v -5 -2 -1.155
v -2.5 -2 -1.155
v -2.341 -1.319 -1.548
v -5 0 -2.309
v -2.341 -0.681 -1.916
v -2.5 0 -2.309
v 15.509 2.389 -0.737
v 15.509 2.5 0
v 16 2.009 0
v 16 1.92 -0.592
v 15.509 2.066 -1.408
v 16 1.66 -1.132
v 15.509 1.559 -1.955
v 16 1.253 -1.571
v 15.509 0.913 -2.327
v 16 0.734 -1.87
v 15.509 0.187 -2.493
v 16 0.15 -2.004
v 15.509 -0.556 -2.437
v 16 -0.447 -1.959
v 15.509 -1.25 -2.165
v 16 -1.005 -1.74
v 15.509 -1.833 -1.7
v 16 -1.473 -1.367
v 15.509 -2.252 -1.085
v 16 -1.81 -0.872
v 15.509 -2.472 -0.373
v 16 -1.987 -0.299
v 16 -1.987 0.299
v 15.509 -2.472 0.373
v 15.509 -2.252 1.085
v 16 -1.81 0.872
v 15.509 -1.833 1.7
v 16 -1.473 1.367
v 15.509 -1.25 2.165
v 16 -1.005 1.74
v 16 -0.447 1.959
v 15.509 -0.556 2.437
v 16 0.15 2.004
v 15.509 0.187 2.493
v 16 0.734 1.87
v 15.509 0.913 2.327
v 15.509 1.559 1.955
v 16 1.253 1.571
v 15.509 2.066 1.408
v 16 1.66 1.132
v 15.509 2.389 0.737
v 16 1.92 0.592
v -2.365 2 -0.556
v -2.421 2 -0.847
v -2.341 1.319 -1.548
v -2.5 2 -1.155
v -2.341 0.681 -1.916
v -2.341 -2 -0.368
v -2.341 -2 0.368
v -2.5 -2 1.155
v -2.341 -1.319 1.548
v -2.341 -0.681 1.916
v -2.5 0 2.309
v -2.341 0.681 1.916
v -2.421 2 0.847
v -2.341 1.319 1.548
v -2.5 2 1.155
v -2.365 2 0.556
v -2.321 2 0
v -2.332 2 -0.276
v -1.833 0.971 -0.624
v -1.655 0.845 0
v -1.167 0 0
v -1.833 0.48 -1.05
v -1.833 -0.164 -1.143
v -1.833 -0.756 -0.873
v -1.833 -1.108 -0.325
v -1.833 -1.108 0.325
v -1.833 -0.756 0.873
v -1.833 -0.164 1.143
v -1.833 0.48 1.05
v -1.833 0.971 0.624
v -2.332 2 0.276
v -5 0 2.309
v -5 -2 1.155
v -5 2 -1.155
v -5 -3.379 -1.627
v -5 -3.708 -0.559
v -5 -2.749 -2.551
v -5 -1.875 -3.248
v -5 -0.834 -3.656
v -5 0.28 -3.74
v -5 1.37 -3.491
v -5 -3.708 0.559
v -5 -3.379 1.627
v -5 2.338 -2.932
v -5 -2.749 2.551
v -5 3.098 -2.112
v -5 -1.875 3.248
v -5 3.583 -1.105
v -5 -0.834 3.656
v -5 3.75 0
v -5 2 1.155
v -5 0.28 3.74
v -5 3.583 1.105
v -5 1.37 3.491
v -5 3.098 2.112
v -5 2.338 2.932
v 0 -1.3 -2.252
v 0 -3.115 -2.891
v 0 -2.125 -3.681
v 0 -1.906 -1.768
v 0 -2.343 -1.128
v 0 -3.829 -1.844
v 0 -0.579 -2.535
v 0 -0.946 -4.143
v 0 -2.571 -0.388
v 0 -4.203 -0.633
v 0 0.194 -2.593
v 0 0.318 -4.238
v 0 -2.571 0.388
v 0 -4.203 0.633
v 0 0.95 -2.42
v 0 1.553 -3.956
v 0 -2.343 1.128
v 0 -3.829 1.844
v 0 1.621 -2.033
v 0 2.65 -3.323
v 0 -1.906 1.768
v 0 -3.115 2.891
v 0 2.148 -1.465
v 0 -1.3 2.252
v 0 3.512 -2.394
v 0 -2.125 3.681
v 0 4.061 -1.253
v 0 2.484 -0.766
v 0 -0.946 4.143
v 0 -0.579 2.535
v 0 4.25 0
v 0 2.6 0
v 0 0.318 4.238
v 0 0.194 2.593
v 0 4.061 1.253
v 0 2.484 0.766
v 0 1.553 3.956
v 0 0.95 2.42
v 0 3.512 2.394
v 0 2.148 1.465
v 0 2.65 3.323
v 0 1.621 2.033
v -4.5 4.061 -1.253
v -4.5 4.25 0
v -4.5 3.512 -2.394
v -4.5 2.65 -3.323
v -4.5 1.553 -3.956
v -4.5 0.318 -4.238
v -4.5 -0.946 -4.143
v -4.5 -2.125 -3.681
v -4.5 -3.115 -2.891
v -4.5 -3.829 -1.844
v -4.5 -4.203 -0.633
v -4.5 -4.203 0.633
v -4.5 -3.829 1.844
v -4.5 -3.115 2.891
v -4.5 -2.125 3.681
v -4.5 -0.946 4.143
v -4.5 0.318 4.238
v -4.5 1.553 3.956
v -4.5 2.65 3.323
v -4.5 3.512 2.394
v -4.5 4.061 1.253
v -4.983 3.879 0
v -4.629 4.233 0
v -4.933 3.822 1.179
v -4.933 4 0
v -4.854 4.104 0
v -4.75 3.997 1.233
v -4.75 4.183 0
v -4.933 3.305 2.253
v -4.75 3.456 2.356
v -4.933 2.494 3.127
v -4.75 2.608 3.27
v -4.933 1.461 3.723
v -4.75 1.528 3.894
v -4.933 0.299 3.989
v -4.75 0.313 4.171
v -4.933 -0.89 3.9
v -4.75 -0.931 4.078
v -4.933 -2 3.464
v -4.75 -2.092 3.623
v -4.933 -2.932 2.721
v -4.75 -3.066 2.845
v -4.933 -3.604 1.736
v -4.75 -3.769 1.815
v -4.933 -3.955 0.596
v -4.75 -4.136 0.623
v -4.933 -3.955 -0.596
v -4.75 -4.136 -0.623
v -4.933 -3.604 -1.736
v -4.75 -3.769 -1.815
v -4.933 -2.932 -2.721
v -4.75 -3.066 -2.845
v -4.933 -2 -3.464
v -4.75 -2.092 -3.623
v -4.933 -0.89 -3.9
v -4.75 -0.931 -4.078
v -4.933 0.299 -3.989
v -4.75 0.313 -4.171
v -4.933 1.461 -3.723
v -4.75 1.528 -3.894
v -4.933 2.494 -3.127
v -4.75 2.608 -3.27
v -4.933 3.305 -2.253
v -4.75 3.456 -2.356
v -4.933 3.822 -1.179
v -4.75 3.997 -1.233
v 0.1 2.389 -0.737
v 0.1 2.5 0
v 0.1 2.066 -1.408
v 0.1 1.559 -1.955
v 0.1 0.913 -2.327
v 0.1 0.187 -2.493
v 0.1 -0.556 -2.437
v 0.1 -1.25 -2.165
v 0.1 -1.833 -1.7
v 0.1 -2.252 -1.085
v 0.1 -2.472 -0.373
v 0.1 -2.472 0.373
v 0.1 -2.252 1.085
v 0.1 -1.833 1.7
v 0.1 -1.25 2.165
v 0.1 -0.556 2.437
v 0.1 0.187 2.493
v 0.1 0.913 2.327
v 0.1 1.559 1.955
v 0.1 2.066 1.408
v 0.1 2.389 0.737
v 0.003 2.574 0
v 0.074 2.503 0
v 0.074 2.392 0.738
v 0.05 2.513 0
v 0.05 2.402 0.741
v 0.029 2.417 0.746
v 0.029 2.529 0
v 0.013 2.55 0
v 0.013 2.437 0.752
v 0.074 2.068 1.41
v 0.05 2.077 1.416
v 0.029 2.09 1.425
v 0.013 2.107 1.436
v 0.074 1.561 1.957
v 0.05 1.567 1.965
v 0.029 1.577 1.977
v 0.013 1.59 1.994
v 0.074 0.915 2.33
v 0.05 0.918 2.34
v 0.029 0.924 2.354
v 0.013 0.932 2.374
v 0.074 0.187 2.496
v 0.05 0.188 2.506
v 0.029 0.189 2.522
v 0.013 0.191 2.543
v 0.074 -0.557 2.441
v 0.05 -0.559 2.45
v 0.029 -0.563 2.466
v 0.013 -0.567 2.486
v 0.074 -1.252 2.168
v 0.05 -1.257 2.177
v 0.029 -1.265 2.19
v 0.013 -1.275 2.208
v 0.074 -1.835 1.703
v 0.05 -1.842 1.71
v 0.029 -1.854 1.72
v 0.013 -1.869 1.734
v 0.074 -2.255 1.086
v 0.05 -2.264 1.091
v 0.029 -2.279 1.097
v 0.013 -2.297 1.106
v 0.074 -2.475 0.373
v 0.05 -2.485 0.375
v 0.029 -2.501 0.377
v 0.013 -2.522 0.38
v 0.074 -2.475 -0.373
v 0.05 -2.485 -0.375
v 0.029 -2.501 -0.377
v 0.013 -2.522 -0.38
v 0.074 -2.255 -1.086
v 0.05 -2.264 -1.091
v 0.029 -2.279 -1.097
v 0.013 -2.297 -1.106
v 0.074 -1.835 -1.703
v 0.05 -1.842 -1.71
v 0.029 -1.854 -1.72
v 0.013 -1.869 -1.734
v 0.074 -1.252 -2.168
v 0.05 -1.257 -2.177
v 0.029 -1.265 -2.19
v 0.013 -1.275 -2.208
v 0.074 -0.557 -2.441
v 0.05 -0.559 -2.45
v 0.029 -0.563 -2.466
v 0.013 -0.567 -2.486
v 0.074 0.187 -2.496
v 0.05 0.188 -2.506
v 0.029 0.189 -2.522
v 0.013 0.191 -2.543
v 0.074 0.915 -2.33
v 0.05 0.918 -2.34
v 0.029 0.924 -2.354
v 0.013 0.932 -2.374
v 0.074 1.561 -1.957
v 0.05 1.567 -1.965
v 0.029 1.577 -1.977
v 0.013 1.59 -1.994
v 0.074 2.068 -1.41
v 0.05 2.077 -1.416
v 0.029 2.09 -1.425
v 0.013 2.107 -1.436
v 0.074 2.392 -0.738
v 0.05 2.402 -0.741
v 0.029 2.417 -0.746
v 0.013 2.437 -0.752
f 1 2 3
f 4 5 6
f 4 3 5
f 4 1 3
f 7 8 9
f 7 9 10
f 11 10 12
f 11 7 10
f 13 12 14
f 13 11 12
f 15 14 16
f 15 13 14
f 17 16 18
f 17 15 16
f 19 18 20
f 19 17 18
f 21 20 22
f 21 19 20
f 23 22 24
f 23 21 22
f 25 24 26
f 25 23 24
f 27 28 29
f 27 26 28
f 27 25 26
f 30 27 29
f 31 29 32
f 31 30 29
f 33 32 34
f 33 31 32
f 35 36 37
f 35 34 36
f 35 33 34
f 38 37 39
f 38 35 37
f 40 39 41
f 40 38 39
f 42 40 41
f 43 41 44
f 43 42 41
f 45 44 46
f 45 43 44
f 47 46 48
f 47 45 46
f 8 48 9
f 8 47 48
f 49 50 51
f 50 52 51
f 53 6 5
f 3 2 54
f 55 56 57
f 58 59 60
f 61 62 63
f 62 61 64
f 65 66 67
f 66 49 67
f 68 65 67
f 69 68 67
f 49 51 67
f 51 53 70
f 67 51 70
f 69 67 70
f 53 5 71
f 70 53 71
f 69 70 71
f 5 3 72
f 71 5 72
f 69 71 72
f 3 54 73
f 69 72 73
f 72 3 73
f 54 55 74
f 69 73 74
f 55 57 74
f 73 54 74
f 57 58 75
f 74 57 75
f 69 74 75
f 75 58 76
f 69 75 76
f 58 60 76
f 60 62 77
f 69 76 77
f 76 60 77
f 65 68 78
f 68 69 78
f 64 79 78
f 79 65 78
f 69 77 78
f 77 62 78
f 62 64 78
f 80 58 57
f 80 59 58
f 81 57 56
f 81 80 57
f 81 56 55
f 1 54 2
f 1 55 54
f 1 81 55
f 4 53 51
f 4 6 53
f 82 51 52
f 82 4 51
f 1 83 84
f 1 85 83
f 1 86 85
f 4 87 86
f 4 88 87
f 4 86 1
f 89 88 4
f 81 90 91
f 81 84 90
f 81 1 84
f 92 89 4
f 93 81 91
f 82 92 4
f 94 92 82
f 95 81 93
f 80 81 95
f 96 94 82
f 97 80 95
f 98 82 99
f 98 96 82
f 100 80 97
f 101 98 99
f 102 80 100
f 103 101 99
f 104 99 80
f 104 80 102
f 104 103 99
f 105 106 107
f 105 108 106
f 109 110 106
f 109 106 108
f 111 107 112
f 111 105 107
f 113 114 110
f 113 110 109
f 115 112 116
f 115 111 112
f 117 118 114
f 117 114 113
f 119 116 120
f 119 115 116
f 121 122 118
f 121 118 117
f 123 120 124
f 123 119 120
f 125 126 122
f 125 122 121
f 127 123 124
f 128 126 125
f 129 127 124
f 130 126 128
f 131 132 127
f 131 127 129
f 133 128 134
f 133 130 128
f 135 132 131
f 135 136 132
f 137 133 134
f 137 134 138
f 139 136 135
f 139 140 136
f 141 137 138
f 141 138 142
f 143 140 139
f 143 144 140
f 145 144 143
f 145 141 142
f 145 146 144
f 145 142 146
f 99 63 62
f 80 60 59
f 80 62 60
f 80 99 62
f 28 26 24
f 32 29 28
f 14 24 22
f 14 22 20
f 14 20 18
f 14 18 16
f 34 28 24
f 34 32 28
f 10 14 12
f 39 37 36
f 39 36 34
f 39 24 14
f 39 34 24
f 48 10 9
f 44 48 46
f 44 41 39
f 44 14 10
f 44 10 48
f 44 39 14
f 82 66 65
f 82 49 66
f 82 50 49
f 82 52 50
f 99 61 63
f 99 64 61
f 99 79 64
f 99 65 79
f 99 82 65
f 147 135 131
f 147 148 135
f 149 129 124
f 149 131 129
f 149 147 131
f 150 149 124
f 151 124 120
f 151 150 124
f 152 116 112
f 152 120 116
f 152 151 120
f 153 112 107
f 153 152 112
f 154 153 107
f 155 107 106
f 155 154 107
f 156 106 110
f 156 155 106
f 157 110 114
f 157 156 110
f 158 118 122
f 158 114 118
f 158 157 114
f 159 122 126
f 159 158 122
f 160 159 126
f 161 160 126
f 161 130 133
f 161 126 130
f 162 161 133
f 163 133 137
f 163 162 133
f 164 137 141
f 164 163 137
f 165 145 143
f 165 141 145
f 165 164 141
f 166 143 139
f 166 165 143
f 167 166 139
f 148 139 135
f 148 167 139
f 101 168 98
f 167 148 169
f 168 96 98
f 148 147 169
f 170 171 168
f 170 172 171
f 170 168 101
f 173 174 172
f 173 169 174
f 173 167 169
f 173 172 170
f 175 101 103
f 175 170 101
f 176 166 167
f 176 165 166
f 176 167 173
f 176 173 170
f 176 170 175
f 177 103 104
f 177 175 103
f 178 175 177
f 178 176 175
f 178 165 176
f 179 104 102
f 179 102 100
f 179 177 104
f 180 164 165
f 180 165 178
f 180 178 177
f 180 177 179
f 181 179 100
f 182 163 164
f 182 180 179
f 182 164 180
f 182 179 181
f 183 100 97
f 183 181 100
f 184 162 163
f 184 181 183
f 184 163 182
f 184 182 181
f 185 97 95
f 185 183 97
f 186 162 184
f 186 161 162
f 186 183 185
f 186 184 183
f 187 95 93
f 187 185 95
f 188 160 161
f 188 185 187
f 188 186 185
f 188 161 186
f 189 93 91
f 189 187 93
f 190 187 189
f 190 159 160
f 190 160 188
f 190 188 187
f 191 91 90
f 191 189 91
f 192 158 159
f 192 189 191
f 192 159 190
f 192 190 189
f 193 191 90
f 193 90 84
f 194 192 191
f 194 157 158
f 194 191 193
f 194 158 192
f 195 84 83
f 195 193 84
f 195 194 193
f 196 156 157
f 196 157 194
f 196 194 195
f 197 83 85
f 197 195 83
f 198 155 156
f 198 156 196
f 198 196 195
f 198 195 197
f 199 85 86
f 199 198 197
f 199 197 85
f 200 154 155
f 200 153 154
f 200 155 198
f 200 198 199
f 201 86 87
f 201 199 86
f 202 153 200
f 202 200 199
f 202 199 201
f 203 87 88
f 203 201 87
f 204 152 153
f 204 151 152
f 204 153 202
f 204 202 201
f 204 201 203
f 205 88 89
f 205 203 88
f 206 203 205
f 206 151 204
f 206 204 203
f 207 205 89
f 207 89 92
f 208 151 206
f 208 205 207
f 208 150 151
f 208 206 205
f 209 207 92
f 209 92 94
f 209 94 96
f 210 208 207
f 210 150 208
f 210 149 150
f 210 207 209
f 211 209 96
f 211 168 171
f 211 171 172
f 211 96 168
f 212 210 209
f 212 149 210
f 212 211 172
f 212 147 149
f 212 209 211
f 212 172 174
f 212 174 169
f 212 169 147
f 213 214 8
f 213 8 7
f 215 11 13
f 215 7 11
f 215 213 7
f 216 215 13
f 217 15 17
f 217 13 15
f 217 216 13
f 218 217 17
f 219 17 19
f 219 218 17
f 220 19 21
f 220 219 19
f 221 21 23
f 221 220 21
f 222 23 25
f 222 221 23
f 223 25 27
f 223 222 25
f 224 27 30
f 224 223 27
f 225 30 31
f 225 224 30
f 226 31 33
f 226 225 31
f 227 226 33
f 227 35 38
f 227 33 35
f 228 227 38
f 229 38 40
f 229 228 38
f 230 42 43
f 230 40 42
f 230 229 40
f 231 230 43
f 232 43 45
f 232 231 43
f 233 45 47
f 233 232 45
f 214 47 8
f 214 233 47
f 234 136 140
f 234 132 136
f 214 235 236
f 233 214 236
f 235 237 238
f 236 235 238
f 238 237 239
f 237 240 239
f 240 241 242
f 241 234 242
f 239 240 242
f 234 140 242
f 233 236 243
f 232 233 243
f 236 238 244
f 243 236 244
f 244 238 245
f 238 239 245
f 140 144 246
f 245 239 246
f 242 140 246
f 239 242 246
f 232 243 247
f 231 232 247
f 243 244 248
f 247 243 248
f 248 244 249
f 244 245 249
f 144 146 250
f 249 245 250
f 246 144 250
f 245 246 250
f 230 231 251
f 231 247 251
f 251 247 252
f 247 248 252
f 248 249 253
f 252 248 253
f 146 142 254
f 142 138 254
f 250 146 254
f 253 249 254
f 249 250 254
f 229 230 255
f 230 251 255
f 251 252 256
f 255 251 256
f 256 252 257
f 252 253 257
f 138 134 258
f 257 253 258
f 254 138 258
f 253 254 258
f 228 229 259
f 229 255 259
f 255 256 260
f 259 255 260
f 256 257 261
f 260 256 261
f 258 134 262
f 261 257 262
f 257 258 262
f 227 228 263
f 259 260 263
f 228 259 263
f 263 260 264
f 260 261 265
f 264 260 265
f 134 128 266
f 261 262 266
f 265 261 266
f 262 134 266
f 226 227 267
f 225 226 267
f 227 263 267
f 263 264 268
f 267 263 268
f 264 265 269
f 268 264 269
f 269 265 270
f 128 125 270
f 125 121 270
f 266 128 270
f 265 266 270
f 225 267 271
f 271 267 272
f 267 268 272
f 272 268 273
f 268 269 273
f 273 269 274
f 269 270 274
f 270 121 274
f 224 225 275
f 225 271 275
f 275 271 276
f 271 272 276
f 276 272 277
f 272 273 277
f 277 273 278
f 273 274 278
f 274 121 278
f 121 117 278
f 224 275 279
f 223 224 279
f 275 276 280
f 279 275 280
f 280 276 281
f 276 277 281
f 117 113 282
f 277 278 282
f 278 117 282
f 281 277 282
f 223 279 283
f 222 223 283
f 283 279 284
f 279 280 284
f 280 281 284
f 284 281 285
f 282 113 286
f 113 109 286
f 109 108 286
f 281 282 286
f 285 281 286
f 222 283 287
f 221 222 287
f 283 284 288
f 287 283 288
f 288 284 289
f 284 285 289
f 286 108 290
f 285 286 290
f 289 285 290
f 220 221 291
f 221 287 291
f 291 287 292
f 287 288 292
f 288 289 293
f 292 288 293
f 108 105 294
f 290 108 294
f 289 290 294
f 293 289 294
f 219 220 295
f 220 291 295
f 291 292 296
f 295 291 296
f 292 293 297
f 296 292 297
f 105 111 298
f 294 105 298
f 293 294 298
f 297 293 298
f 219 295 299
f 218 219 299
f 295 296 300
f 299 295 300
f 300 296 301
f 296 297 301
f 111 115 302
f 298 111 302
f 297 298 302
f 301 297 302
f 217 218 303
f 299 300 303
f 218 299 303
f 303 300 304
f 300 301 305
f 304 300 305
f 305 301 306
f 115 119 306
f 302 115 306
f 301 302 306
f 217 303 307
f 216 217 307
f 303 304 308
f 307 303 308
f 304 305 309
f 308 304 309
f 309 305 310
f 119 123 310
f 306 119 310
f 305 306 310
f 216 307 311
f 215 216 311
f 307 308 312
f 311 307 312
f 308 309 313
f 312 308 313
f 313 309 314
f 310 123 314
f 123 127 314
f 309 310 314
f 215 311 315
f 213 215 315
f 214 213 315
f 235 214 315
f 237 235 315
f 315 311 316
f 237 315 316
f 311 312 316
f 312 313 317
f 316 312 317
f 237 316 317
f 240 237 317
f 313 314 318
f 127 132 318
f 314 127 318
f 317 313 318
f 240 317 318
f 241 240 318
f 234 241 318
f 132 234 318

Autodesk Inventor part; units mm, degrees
ref_plane "YZ Plane" through (0, 0, 0) normal (1, 0, 0) x (0, 1, 0)
ref_plane "XZ Plane" through (0, 0, 0) normal (0, 1, 0) x (-1, 0, 0)
sketch "Szkic1" plane through (0, 0, 0) normal (0, 0, 1) x (1, 0, 0)
  line L0 (-1.1667, 0) -> (16, 0)
  line L1 (16, 0) -> (16, 2.5)
  line L2 (16, 2.5) -> (2.4, 2.5)
  line L3 (2.4, 2.5) -> (1.9091, 2.5)
  line L4 (1.9091, 2.5) -> (0, 2.5)
  line L5 (0, 2.5) -> (0, 4.25)
  line L6 (0, 4.25) -> (-5, 4.25)
  line L7 (-5, 4.25) -> (-5, 2.3094)
  line L8 (-5, 2.3094) -> (-2.5, 2.3094)
  line L9 (-2.5, 2.3094) -> (-1.1667, 0)
  line L10 (-9.2, 0) -> (20.2, 0) projected
  line L11 (0, -0.85) -> (0, 5.1) projected
  line L12 (2.4, 2.5) -> (0, 2.5) construction
  dimension "d1" = 13.6
  dimension "d2" = 0.4909
  dimension "d3" = 5
  dimension "d4" = 2.5
  dimension "d5" = 60
  dimension "d6" = 5
  dimension "d7" = 5
  dimension "d8" = 4.6188
  dimension "d9" = 8.5
  dimension "d26" = 16
revolve "Bryła" add sketch "Szkic1" angle 360 about axis through (-1.1667, 0, 0) along (1, 0, 0)
sketch "Szkic2" plane through (-5, 0, 0) normal (-1, 0, 0) x (0, 0, 1)
  circle A0 centre (0, 0) radius 2.3094 projected
  line L0 (0, -5.95) -> (0, 5.95) projected
  line L1 (-5.95, 0) -> (5.95, 0) projected
  line L2 (2.3094, 0) -> (1.1547, -2)
  line L3 (1.1547, -2) -> (-1.1547, -2)
  line L4 (-1.1547, -2) -> (-2.3094, 0)
  line L5 (-2.3094, 0) -> (-1.1547, 2)
  line L6 (-1.1547, 2) -> (1.1547, 2)
  line L7 (1.1547, 2) -> (2.3094, 0)
extrude "Szczelina" add sketch "Szkic2" against normal up to next contours L7 A0 | A0 L2 | L6 L0 A0 | A0 L0 L3 | L0 L6 A0 | A0 L3 L0 | L4 A0 | A0 L5
fillet "Zaokrąglenie1" radius 0.5 1 edges at (-5, -4.25, 0)
thread "Gwint" size "M5x0.8" class "6g" standard "ISO Metric profile" length 13.6
chamfer "Faza1" distance 0.4908 distance2 0.4908 1 edges at (16, -2.5, 0) measured on face at (16, -1.1374, -1.1324)
ref_plane "Work Plane1" through (29, 0, 0) normal (0, -1, 0) x (1, 0, 0)
fillet "Fillet2" radius 0.1 1 edges at (0, -2.5, 0)
equation "\"d1\" = GEL"
equation "\"d3\" = KOH"
equation "\"d4\" = INTI"
equation "\"d6\" = GD"
equation "\"d7\" = BDM"
equation "\"d8\" = 1.1547 * SW"
equation "\"d9\" = KOD"
equation "\"d26\" = NLG"
equation "\"d30\" = R"
equation "\"d17\" = RR"
equation "\"d13\" = GEL"
equation "\"d15\" = -0.5 * SPD + 0.5 * GD"
equation "\"d16\" = GUL"
equation "\"GD\" = 5"
equation "\"NLG\" = 16"
equation "\"GEL\" = 13.6"
equation "\"KOD\" = 8.5"
equation "\"KOH\" = 5"
equation "\"INTI\" = 2.5"
equation "\"GAL\" = 0.61345 * PTC"
equation "\"GUL\" = 0.61345 * PTC"
equation "\"BDM\" = NND"
equation "\"SW\" = 4"
equation "\"RR\" = 0.5"
equation "\"SPD\" = NND - 1.2269 * PTC"
equation "\"R\" = 0.1"
equation "\"TOA\" = 30deg"
equation "\"GD1\" = THREADDIA - 1.2269 * PTC"
equation "\"THREADDIA\" = 5"
equation "\"FAWI\" = 45deg"
equation "\"PTC\" = 0.8"
equation "\"NND\" = 5"
equation "\"E0\" = 1.155 * SW"
properties part number "ISO 4762  - M5 x 16" material "Stal nierdzewna 440C"
